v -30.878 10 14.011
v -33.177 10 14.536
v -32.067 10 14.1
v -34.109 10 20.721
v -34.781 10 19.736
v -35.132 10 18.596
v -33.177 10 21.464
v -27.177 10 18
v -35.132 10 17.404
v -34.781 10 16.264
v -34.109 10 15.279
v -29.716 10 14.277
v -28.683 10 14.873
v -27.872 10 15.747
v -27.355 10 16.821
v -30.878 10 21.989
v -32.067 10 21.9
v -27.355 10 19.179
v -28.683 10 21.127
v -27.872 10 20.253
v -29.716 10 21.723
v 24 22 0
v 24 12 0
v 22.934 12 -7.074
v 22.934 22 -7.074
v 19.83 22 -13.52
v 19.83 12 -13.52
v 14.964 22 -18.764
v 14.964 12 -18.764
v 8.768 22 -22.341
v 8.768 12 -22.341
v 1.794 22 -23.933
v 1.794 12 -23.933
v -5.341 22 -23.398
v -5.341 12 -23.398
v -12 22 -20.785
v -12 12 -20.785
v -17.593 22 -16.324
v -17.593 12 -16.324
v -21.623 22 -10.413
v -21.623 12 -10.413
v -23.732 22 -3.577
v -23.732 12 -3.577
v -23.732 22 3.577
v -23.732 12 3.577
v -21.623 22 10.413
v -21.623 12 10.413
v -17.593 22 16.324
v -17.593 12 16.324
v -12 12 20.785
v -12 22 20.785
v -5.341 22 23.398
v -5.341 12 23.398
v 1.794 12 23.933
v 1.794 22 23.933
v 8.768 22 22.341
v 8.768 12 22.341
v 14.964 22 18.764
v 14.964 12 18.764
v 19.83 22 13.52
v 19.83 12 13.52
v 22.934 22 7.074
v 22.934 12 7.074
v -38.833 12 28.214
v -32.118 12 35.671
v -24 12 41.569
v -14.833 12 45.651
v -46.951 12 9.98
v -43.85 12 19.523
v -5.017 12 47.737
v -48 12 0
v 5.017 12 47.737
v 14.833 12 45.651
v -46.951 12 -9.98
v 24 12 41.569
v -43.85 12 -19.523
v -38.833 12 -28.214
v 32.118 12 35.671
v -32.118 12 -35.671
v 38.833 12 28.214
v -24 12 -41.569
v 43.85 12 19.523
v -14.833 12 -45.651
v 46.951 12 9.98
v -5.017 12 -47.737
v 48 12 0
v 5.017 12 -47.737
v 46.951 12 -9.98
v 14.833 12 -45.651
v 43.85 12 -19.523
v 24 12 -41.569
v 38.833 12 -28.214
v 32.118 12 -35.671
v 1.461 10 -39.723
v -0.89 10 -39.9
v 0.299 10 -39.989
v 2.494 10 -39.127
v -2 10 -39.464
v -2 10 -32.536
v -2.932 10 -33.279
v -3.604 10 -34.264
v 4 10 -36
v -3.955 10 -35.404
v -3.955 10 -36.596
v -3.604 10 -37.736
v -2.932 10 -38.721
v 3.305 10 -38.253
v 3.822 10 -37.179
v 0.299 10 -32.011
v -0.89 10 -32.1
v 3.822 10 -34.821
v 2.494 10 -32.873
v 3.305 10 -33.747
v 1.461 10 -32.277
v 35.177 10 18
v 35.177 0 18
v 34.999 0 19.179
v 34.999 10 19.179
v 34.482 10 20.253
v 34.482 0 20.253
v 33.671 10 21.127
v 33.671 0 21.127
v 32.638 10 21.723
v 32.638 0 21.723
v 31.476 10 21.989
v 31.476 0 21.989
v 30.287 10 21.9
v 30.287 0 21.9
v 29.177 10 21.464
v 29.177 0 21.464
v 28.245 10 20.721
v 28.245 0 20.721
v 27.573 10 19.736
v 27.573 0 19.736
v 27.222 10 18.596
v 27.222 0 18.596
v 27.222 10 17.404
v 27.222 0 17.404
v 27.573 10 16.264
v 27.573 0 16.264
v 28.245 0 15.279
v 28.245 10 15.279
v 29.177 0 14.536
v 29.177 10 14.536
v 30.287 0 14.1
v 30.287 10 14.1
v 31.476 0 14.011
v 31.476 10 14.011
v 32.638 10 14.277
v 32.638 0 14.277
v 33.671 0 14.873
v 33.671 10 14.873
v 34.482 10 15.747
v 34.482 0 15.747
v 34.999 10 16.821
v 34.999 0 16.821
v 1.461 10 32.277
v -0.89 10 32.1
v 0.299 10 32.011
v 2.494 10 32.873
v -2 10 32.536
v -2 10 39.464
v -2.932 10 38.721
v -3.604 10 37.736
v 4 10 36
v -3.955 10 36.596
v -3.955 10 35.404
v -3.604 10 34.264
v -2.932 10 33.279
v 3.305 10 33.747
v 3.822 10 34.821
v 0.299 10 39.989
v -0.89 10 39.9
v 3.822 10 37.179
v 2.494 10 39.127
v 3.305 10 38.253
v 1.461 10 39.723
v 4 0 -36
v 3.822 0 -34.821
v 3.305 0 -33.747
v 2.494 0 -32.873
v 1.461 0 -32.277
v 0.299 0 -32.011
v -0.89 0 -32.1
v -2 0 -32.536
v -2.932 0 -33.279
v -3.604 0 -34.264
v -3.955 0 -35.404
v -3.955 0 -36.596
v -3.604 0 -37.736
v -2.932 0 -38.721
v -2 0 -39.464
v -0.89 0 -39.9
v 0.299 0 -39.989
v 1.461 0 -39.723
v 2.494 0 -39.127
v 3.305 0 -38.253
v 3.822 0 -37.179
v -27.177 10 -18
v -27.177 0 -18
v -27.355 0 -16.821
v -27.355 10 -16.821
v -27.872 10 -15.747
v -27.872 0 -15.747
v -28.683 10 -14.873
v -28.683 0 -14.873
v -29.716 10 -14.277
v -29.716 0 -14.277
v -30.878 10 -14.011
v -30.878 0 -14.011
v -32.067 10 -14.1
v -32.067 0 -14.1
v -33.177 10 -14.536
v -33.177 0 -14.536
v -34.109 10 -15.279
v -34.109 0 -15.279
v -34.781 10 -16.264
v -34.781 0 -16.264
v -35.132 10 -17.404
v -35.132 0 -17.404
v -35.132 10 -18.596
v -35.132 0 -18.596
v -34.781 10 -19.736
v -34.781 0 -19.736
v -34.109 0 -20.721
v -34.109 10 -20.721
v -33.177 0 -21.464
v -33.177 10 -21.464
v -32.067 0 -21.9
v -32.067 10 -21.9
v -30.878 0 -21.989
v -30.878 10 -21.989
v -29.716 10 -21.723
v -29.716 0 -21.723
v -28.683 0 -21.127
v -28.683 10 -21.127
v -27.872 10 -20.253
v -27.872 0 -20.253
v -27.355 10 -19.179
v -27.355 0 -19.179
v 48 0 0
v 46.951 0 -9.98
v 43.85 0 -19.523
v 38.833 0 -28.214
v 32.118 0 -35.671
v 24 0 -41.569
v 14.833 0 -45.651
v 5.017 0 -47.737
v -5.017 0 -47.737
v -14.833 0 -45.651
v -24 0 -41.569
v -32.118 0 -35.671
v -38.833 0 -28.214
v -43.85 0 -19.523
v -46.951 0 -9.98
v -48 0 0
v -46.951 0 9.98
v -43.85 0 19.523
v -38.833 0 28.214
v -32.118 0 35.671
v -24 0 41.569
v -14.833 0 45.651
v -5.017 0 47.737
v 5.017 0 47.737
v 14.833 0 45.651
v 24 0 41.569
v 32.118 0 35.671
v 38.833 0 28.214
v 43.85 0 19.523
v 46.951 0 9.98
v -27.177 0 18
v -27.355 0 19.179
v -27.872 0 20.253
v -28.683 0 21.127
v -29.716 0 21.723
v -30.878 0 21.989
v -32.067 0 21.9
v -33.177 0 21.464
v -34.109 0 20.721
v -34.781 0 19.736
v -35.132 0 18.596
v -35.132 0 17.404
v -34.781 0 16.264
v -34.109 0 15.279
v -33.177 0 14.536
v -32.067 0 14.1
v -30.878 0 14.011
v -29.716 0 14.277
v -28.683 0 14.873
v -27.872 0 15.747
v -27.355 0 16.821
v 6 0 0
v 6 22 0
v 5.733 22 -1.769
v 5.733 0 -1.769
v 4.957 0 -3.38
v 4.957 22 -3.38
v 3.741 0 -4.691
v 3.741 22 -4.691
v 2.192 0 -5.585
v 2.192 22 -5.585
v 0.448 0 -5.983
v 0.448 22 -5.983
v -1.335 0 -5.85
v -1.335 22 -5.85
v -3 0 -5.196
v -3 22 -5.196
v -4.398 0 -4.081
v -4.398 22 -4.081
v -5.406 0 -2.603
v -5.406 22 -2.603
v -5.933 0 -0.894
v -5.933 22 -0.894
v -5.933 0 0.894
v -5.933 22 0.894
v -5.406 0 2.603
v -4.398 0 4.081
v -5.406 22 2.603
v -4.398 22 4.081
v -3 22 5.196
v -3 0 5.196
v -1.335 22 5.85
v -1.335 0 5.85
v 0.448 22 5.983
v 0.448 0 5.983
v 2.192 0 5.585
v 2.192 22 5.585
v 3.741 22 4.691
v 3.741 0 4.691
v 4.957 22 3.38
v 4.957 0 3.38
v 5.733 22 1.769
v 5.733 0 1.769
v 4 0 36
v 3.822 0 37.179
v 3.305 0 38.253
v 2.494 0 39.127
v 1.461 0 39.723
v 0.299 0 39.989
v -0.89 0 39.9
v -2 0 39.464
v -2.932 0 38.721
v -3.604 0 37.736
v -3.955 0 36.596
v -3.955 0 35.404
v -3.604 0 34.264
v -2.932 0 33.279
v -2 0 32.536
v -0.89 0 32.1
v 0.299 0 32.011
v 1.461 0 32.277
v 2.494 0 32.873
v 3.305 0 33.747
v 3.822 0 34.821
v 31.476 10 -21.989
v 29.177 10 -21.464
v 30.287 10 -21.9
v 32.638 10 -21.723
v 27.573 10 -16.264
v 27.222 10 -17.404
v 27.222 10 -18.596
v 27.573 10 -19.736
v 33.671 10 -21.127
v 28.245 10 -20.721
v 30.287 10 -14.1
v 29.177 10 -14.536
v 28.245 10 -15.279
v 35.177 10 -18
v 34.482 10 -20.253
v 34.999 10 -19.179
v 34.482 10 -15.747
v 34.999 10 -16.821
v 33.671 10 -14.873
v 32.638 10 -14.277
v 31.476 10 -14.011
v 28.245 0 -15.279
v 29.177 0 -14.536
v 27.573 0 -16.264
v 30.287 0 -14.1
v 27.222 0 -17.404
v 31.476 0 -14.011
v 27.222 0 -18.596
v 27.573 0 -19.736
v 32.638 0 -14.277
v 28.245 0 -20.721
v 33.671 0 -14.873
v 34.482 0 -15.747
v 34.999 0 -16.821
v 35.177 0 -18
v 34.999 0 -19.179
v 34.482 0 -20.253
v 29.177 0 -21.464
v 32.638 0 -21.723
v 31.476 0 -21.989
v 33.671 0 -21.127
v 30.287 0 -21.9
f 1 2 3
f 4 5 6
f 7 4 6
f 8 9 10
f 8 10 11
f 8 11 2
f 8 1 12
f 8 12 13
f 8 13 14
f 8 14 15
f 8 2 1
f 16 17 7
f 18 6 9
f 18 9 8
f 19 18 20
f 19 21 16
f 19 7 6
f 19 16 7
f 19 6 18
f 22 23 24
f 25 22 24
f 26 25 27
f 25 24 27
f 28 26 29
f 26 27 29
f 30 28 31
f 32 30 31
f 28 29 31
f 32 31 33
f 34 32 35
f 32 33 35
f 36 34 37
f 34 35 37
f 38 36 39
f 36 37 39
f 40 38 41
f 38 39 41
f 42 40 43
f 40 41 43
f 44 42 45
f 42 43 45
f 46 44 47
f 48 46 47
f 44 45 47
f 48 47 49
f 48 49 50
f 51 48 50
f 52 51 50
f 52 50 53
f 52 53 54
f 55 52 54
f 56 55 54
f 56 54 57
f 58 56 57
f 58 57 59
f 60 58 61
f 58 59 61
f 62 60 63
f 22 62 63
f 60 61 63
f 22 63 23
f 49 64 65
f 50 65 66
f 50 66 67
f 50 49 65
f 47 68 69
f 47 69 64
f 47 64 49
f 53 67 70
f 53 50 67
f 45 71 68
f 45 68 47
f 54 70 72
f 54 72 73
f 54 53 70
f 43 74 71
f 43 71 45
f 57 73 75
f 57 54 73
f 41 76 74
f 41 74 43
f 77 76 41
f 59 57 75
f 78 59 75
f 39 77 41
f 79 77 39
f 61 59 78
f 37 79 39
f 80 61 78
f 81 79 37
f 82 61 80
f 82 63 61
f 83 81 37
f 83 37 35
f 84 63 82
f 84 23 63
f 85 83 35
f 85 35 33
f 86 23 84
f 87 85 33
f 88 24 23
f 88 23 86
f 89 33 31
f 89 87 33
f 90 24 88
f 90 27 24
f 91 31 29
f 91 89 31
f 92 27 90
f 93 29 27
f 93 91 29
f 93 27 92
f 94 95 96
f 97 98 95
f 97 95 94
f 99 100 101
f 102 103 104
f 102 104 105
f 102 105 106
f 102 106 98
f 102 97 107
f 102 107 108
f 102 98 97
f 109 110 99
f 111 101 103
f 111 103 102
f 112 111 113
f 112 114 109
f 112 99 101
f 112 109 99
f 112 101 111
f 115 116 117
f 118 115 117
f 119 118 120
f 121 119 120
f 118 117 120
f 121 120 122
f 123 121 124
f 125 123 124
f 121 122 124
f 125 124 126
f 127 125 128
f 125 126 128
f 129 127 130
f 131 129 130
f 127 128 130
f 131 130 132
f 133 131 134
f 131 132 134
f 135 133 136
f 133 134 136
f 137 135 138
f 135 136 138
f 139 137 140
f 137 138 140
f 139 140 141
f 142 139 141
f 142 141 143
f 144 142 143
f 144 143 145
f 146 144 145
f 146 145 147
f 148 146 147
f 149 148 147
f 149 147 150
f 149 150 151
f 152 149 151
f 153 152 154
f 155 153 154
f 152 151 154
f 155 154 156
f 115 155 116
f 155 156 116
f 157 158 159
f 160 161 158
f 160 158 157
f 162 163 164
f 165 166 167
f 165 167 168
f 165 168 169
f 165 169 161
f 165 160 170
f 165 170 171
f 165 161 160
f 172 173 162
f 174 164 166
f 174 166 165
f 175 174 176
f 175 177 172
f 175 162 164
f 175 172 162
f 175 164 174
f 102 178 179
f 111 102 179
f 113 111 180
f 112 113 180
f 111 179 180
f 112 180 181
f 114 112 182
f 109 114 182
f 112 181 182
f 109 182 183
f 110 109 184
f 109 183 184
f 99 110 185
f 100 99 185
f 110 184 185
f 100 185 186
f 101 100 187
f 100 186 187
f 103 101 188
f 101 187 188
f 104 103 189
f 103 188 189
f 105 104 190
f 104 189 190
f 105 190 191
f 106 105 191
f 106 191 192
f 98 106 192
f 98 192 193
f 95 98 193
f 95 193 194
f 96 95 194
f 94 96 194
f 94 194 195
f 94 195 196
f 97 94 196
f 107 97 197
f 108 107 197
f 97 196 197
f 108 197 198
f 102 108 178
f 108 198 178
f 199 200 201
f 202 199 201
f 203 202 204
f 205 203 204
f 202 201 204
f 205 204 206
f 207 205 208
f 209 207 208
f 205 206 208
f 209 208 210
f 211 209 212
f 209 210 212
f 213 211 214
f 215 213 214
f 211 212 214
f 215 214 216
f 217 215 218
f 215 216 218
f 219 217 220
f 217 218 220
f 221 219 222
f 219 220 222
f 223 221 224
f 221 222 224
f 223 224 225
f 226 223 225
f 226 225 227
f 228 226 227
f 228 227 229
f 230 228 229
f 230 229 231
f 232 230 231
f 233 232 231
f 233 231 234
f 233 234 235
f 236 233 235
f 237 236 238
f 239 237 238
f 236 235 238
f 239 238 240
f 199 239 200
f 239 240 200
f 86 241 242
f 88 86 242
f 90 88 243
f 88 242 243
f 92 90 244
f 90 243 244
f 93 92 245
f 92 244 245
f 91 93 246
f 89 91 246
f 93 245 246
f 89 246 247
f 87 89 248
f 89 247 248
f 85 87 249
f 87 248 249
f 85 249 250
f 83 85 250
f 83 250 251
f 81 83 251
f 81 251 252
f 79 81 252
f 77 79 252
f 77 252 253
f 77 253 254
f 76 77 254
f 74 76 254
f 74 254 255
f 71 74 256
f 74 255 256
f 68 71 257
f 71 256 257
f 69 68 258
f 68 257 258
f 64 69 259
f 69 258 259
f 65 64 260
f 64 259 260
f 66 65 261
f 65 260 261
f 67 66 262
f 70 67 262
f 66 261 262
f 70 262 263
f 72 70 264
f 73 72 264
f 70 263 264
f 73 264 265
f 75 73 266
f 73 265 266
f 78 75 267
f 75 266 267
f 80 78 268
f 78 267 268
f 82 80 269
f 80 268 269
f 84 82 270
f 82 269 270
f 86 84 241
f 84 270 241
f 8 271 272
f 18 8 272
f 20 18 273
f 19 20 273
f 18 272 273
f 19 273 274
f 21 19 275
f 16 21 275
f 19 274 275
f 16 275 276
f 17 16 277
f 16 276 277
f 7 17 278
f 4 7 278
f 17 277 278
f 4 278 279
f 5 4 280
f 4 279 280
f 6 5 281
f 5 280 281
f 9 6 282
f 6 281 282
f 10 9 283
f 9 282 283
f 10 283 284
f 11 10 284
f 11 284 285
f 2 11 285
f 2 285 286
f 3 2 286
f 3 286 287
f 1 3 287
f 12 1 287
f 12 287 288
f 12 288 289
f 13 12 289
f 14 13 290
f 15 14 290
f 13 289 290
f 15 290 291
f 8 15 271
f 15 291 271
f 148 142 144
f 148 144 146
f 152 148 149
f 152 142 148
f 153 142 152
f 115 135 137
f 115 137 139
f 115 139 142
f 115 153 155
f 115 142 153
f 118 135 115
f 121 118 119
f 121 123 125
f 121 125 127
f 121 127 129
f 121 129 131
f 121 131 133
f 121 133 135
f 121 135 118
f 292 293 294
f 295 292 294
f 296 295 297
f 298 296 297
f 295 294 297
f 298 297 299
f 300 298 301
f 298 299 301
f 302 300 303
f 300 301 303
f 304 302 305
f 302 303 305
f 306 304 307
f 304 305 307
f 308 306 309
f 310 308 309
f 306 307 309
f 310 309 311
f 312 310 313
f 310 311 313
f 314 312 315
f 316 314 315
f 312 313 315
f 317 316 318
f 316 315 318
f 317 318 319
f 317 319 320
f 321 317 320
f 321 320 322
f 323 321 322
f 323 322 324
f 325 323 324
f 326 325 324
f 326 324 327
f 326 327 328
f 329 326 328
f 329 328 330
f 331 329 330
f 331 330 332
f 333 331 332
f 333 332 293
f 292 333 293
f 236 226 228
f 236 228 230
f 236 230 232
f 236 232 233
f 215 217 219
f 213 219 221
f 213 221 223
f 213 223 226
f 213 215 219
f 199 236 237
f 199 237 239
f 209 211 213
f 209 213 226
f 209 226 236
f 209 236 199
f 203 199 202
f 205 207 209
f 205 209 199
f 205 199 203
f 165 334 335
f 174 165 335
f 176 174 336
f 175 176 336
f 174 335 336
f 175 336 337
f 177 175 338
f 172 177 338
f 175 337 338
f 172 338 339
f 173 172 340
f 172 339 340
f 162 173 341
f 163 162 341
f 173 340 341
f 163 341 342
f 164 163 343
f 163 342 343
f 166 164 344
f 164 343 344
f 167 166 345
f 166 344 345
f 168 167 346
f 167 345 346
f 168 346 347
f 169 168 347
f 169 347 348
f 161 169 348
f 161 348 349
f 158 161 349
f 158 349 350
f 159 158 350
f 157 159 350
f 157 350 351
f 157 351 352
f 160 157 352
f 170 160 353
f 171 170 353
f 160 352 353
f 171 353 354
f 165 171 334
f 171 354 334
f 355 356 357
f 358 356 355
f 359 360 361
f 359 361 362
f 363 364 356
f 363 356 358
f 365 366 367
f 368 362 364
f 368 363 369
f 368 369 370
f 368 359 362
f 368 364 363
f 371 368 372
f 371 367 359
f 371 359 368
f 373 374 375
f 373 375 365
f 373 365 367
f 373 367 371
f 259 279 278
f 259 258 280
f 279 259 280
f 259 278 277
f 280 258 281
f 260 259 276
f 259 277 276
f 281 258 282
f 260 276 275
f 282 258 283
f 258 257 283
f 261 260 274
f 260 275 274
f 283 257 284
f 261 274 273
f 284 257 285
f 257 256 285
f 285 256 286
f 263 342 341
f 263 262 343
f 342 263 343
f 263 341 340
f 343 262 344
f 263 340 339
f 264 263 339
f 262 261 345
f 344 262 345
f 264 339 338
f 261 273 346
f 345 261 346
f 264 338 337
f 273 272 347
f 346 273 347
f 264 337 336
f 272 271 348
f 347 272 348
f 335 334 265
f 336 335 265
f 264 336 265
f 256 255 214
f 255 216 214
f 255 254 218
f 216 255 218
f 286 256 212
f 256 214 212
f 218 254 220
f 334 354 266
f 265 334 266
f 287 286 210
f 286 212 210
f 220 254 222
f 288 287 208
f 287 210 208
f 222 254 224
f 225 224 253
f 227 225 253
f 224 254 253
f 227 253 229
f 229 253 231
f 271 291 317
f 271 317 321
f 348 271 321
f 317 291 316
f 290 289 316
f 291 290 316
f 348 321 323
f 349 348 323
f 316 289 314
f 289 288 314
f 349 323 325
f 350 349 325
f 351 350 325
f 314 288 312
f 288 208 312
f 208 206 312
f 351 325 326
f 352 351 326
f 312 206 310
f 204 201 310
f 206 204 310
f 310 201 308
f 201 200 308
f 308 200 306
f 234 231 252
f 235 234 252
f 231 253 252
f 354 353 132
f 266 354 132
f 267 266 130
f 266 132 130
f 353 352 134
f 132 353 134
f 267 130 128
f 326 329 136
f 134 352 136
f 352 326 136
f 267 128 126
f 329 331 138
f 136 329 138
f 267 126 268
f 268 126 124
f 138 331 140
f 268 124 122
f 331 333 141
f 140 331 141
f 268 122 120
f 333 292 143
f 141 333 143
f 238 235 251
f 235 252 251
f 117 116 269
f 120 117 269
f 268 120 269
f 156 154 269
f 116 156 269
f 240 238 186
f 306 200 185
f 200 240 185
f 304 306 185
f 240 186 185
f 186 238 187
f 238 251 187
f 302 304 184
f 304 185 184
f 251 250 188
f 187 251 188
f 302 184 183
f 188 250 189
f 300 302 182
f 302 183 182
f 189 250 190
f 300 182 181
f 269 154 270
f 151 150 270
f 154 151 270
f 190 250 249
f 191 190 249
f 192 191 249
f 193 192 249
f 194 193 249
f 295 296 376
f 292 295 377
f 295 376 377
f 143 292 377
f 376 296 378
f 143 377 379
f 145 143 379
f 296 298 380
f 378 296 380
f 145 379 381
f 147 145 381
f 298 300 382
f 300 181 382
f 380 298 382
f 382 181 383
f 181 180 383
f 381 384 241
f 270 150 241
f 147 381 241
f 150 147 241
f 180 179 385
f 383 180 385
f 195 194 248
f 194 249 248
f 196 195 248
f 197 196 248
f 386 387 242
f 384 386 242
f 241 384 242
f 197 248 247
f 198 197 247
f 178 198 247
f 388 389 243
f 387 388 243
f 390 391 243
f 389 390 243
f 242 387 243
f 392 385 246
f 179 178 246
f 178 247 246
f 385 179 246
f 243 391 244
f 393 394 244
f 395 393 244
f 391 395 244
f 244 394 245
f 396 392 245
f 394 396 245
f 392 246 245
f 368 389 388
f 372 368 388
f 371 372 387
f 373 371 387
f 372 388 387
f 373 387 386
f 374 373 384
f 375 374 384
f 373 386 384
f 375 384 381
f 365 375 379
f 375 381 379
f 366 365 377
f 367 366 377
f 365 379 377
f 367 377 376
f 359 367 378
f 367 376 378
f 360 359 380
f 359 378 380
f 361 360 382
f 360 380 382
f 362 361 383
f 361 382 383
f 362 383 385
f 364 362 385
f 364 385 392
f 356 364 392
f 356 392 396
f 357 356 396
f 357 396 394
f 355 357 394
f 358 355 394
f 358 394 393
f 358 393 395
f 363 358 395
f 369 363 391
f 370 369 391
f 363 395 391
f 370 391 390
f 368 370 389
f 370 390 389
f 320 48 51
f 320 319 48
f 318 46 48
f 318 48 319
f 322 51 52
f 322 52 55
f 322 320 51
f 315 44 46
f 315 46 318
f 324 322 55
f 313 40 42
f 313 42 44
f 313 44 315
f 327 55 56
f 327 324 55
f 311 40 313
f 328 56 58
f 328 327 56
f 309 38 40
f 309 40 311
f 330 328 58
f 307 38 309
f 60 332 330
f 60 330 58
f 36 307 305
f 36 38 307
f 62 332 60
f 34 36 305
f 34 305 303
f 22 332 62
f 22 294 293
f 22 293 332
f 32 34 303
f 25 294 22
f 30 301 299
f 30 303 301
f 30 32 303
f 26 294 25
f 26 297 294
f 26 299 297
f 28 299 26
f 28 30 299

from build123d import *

# Parameters (mm, degrees)
SKETCH1_R           = 48
BOSS_EXTRUDE1_DEPTH = 12
SKETCH2_R           = 24
BOSS_EXTRUDE2_DEPTH = 10
SKETCH3_R           = 6
CUT_EXTRUDE1_DEPTH  = 34
SKETCH4_R           = 4
CUT_EXTRUDE2_DEPTH  = 10


with BuildPart() as part:
    # Sketch1 → Boss-Extrude1 (new body)
    with BuildSketch(Plane(origin=(0, 0, 0), x_dir=(1, 0, 0), z_dir=(0, 1, 0))):
        Circle(SKETCH1_R)
    extrude(amount=BOSS_EXTRUDE1_DEPTH)

    # Sketch2 → Boss-Extrude2 (add)
    with BuildSketch(Plane(origin=(0, 12, 0), x_dir=(1, 0, 0), z_dir=(0, 1, 0))):
        Circle(SKETCH2_R)
    extrude(amount=BOSS_EXTRUDE2_DEPTH)

    # Sketch3 → Cut-Extrude1 (cut)
    with BuildSketch(Plane(origin=(0, 22, 0), x_dir=(1, 0, 0), z_dir=(0, 1, 0))):
        Circle(SKETCH3_R)
    extrude(amount=-CUT_EXTRUDE1_DEPTH, mode=Mode.SUBTRACT)

    # Sketch4 → Cut-Extrude2 (cut)
    with BuildSketch(Plane.XZ):
        with Locations((0, 36)):
            Circle(SKETCH4_R)
        with Locations((31.176914536, 18)):
            Circle(SKETCH4_R)
        with Locations((31.176914536, -18)):
            Circle(SKETCH4_R)
        with Locations((0, -36)):
            Circle(SKETCH4_R)
        with Locations((-31.176914536, -18)):
            Circle(SKETCH4_R)
        with Locations((-31.176914536, 18)):
            Circle(SKETCH4_R)
    extrude(amount=-CUT_EXTRUDE2_DEPTH, mode=Mode.SUBTRACT)


solid = part.part
